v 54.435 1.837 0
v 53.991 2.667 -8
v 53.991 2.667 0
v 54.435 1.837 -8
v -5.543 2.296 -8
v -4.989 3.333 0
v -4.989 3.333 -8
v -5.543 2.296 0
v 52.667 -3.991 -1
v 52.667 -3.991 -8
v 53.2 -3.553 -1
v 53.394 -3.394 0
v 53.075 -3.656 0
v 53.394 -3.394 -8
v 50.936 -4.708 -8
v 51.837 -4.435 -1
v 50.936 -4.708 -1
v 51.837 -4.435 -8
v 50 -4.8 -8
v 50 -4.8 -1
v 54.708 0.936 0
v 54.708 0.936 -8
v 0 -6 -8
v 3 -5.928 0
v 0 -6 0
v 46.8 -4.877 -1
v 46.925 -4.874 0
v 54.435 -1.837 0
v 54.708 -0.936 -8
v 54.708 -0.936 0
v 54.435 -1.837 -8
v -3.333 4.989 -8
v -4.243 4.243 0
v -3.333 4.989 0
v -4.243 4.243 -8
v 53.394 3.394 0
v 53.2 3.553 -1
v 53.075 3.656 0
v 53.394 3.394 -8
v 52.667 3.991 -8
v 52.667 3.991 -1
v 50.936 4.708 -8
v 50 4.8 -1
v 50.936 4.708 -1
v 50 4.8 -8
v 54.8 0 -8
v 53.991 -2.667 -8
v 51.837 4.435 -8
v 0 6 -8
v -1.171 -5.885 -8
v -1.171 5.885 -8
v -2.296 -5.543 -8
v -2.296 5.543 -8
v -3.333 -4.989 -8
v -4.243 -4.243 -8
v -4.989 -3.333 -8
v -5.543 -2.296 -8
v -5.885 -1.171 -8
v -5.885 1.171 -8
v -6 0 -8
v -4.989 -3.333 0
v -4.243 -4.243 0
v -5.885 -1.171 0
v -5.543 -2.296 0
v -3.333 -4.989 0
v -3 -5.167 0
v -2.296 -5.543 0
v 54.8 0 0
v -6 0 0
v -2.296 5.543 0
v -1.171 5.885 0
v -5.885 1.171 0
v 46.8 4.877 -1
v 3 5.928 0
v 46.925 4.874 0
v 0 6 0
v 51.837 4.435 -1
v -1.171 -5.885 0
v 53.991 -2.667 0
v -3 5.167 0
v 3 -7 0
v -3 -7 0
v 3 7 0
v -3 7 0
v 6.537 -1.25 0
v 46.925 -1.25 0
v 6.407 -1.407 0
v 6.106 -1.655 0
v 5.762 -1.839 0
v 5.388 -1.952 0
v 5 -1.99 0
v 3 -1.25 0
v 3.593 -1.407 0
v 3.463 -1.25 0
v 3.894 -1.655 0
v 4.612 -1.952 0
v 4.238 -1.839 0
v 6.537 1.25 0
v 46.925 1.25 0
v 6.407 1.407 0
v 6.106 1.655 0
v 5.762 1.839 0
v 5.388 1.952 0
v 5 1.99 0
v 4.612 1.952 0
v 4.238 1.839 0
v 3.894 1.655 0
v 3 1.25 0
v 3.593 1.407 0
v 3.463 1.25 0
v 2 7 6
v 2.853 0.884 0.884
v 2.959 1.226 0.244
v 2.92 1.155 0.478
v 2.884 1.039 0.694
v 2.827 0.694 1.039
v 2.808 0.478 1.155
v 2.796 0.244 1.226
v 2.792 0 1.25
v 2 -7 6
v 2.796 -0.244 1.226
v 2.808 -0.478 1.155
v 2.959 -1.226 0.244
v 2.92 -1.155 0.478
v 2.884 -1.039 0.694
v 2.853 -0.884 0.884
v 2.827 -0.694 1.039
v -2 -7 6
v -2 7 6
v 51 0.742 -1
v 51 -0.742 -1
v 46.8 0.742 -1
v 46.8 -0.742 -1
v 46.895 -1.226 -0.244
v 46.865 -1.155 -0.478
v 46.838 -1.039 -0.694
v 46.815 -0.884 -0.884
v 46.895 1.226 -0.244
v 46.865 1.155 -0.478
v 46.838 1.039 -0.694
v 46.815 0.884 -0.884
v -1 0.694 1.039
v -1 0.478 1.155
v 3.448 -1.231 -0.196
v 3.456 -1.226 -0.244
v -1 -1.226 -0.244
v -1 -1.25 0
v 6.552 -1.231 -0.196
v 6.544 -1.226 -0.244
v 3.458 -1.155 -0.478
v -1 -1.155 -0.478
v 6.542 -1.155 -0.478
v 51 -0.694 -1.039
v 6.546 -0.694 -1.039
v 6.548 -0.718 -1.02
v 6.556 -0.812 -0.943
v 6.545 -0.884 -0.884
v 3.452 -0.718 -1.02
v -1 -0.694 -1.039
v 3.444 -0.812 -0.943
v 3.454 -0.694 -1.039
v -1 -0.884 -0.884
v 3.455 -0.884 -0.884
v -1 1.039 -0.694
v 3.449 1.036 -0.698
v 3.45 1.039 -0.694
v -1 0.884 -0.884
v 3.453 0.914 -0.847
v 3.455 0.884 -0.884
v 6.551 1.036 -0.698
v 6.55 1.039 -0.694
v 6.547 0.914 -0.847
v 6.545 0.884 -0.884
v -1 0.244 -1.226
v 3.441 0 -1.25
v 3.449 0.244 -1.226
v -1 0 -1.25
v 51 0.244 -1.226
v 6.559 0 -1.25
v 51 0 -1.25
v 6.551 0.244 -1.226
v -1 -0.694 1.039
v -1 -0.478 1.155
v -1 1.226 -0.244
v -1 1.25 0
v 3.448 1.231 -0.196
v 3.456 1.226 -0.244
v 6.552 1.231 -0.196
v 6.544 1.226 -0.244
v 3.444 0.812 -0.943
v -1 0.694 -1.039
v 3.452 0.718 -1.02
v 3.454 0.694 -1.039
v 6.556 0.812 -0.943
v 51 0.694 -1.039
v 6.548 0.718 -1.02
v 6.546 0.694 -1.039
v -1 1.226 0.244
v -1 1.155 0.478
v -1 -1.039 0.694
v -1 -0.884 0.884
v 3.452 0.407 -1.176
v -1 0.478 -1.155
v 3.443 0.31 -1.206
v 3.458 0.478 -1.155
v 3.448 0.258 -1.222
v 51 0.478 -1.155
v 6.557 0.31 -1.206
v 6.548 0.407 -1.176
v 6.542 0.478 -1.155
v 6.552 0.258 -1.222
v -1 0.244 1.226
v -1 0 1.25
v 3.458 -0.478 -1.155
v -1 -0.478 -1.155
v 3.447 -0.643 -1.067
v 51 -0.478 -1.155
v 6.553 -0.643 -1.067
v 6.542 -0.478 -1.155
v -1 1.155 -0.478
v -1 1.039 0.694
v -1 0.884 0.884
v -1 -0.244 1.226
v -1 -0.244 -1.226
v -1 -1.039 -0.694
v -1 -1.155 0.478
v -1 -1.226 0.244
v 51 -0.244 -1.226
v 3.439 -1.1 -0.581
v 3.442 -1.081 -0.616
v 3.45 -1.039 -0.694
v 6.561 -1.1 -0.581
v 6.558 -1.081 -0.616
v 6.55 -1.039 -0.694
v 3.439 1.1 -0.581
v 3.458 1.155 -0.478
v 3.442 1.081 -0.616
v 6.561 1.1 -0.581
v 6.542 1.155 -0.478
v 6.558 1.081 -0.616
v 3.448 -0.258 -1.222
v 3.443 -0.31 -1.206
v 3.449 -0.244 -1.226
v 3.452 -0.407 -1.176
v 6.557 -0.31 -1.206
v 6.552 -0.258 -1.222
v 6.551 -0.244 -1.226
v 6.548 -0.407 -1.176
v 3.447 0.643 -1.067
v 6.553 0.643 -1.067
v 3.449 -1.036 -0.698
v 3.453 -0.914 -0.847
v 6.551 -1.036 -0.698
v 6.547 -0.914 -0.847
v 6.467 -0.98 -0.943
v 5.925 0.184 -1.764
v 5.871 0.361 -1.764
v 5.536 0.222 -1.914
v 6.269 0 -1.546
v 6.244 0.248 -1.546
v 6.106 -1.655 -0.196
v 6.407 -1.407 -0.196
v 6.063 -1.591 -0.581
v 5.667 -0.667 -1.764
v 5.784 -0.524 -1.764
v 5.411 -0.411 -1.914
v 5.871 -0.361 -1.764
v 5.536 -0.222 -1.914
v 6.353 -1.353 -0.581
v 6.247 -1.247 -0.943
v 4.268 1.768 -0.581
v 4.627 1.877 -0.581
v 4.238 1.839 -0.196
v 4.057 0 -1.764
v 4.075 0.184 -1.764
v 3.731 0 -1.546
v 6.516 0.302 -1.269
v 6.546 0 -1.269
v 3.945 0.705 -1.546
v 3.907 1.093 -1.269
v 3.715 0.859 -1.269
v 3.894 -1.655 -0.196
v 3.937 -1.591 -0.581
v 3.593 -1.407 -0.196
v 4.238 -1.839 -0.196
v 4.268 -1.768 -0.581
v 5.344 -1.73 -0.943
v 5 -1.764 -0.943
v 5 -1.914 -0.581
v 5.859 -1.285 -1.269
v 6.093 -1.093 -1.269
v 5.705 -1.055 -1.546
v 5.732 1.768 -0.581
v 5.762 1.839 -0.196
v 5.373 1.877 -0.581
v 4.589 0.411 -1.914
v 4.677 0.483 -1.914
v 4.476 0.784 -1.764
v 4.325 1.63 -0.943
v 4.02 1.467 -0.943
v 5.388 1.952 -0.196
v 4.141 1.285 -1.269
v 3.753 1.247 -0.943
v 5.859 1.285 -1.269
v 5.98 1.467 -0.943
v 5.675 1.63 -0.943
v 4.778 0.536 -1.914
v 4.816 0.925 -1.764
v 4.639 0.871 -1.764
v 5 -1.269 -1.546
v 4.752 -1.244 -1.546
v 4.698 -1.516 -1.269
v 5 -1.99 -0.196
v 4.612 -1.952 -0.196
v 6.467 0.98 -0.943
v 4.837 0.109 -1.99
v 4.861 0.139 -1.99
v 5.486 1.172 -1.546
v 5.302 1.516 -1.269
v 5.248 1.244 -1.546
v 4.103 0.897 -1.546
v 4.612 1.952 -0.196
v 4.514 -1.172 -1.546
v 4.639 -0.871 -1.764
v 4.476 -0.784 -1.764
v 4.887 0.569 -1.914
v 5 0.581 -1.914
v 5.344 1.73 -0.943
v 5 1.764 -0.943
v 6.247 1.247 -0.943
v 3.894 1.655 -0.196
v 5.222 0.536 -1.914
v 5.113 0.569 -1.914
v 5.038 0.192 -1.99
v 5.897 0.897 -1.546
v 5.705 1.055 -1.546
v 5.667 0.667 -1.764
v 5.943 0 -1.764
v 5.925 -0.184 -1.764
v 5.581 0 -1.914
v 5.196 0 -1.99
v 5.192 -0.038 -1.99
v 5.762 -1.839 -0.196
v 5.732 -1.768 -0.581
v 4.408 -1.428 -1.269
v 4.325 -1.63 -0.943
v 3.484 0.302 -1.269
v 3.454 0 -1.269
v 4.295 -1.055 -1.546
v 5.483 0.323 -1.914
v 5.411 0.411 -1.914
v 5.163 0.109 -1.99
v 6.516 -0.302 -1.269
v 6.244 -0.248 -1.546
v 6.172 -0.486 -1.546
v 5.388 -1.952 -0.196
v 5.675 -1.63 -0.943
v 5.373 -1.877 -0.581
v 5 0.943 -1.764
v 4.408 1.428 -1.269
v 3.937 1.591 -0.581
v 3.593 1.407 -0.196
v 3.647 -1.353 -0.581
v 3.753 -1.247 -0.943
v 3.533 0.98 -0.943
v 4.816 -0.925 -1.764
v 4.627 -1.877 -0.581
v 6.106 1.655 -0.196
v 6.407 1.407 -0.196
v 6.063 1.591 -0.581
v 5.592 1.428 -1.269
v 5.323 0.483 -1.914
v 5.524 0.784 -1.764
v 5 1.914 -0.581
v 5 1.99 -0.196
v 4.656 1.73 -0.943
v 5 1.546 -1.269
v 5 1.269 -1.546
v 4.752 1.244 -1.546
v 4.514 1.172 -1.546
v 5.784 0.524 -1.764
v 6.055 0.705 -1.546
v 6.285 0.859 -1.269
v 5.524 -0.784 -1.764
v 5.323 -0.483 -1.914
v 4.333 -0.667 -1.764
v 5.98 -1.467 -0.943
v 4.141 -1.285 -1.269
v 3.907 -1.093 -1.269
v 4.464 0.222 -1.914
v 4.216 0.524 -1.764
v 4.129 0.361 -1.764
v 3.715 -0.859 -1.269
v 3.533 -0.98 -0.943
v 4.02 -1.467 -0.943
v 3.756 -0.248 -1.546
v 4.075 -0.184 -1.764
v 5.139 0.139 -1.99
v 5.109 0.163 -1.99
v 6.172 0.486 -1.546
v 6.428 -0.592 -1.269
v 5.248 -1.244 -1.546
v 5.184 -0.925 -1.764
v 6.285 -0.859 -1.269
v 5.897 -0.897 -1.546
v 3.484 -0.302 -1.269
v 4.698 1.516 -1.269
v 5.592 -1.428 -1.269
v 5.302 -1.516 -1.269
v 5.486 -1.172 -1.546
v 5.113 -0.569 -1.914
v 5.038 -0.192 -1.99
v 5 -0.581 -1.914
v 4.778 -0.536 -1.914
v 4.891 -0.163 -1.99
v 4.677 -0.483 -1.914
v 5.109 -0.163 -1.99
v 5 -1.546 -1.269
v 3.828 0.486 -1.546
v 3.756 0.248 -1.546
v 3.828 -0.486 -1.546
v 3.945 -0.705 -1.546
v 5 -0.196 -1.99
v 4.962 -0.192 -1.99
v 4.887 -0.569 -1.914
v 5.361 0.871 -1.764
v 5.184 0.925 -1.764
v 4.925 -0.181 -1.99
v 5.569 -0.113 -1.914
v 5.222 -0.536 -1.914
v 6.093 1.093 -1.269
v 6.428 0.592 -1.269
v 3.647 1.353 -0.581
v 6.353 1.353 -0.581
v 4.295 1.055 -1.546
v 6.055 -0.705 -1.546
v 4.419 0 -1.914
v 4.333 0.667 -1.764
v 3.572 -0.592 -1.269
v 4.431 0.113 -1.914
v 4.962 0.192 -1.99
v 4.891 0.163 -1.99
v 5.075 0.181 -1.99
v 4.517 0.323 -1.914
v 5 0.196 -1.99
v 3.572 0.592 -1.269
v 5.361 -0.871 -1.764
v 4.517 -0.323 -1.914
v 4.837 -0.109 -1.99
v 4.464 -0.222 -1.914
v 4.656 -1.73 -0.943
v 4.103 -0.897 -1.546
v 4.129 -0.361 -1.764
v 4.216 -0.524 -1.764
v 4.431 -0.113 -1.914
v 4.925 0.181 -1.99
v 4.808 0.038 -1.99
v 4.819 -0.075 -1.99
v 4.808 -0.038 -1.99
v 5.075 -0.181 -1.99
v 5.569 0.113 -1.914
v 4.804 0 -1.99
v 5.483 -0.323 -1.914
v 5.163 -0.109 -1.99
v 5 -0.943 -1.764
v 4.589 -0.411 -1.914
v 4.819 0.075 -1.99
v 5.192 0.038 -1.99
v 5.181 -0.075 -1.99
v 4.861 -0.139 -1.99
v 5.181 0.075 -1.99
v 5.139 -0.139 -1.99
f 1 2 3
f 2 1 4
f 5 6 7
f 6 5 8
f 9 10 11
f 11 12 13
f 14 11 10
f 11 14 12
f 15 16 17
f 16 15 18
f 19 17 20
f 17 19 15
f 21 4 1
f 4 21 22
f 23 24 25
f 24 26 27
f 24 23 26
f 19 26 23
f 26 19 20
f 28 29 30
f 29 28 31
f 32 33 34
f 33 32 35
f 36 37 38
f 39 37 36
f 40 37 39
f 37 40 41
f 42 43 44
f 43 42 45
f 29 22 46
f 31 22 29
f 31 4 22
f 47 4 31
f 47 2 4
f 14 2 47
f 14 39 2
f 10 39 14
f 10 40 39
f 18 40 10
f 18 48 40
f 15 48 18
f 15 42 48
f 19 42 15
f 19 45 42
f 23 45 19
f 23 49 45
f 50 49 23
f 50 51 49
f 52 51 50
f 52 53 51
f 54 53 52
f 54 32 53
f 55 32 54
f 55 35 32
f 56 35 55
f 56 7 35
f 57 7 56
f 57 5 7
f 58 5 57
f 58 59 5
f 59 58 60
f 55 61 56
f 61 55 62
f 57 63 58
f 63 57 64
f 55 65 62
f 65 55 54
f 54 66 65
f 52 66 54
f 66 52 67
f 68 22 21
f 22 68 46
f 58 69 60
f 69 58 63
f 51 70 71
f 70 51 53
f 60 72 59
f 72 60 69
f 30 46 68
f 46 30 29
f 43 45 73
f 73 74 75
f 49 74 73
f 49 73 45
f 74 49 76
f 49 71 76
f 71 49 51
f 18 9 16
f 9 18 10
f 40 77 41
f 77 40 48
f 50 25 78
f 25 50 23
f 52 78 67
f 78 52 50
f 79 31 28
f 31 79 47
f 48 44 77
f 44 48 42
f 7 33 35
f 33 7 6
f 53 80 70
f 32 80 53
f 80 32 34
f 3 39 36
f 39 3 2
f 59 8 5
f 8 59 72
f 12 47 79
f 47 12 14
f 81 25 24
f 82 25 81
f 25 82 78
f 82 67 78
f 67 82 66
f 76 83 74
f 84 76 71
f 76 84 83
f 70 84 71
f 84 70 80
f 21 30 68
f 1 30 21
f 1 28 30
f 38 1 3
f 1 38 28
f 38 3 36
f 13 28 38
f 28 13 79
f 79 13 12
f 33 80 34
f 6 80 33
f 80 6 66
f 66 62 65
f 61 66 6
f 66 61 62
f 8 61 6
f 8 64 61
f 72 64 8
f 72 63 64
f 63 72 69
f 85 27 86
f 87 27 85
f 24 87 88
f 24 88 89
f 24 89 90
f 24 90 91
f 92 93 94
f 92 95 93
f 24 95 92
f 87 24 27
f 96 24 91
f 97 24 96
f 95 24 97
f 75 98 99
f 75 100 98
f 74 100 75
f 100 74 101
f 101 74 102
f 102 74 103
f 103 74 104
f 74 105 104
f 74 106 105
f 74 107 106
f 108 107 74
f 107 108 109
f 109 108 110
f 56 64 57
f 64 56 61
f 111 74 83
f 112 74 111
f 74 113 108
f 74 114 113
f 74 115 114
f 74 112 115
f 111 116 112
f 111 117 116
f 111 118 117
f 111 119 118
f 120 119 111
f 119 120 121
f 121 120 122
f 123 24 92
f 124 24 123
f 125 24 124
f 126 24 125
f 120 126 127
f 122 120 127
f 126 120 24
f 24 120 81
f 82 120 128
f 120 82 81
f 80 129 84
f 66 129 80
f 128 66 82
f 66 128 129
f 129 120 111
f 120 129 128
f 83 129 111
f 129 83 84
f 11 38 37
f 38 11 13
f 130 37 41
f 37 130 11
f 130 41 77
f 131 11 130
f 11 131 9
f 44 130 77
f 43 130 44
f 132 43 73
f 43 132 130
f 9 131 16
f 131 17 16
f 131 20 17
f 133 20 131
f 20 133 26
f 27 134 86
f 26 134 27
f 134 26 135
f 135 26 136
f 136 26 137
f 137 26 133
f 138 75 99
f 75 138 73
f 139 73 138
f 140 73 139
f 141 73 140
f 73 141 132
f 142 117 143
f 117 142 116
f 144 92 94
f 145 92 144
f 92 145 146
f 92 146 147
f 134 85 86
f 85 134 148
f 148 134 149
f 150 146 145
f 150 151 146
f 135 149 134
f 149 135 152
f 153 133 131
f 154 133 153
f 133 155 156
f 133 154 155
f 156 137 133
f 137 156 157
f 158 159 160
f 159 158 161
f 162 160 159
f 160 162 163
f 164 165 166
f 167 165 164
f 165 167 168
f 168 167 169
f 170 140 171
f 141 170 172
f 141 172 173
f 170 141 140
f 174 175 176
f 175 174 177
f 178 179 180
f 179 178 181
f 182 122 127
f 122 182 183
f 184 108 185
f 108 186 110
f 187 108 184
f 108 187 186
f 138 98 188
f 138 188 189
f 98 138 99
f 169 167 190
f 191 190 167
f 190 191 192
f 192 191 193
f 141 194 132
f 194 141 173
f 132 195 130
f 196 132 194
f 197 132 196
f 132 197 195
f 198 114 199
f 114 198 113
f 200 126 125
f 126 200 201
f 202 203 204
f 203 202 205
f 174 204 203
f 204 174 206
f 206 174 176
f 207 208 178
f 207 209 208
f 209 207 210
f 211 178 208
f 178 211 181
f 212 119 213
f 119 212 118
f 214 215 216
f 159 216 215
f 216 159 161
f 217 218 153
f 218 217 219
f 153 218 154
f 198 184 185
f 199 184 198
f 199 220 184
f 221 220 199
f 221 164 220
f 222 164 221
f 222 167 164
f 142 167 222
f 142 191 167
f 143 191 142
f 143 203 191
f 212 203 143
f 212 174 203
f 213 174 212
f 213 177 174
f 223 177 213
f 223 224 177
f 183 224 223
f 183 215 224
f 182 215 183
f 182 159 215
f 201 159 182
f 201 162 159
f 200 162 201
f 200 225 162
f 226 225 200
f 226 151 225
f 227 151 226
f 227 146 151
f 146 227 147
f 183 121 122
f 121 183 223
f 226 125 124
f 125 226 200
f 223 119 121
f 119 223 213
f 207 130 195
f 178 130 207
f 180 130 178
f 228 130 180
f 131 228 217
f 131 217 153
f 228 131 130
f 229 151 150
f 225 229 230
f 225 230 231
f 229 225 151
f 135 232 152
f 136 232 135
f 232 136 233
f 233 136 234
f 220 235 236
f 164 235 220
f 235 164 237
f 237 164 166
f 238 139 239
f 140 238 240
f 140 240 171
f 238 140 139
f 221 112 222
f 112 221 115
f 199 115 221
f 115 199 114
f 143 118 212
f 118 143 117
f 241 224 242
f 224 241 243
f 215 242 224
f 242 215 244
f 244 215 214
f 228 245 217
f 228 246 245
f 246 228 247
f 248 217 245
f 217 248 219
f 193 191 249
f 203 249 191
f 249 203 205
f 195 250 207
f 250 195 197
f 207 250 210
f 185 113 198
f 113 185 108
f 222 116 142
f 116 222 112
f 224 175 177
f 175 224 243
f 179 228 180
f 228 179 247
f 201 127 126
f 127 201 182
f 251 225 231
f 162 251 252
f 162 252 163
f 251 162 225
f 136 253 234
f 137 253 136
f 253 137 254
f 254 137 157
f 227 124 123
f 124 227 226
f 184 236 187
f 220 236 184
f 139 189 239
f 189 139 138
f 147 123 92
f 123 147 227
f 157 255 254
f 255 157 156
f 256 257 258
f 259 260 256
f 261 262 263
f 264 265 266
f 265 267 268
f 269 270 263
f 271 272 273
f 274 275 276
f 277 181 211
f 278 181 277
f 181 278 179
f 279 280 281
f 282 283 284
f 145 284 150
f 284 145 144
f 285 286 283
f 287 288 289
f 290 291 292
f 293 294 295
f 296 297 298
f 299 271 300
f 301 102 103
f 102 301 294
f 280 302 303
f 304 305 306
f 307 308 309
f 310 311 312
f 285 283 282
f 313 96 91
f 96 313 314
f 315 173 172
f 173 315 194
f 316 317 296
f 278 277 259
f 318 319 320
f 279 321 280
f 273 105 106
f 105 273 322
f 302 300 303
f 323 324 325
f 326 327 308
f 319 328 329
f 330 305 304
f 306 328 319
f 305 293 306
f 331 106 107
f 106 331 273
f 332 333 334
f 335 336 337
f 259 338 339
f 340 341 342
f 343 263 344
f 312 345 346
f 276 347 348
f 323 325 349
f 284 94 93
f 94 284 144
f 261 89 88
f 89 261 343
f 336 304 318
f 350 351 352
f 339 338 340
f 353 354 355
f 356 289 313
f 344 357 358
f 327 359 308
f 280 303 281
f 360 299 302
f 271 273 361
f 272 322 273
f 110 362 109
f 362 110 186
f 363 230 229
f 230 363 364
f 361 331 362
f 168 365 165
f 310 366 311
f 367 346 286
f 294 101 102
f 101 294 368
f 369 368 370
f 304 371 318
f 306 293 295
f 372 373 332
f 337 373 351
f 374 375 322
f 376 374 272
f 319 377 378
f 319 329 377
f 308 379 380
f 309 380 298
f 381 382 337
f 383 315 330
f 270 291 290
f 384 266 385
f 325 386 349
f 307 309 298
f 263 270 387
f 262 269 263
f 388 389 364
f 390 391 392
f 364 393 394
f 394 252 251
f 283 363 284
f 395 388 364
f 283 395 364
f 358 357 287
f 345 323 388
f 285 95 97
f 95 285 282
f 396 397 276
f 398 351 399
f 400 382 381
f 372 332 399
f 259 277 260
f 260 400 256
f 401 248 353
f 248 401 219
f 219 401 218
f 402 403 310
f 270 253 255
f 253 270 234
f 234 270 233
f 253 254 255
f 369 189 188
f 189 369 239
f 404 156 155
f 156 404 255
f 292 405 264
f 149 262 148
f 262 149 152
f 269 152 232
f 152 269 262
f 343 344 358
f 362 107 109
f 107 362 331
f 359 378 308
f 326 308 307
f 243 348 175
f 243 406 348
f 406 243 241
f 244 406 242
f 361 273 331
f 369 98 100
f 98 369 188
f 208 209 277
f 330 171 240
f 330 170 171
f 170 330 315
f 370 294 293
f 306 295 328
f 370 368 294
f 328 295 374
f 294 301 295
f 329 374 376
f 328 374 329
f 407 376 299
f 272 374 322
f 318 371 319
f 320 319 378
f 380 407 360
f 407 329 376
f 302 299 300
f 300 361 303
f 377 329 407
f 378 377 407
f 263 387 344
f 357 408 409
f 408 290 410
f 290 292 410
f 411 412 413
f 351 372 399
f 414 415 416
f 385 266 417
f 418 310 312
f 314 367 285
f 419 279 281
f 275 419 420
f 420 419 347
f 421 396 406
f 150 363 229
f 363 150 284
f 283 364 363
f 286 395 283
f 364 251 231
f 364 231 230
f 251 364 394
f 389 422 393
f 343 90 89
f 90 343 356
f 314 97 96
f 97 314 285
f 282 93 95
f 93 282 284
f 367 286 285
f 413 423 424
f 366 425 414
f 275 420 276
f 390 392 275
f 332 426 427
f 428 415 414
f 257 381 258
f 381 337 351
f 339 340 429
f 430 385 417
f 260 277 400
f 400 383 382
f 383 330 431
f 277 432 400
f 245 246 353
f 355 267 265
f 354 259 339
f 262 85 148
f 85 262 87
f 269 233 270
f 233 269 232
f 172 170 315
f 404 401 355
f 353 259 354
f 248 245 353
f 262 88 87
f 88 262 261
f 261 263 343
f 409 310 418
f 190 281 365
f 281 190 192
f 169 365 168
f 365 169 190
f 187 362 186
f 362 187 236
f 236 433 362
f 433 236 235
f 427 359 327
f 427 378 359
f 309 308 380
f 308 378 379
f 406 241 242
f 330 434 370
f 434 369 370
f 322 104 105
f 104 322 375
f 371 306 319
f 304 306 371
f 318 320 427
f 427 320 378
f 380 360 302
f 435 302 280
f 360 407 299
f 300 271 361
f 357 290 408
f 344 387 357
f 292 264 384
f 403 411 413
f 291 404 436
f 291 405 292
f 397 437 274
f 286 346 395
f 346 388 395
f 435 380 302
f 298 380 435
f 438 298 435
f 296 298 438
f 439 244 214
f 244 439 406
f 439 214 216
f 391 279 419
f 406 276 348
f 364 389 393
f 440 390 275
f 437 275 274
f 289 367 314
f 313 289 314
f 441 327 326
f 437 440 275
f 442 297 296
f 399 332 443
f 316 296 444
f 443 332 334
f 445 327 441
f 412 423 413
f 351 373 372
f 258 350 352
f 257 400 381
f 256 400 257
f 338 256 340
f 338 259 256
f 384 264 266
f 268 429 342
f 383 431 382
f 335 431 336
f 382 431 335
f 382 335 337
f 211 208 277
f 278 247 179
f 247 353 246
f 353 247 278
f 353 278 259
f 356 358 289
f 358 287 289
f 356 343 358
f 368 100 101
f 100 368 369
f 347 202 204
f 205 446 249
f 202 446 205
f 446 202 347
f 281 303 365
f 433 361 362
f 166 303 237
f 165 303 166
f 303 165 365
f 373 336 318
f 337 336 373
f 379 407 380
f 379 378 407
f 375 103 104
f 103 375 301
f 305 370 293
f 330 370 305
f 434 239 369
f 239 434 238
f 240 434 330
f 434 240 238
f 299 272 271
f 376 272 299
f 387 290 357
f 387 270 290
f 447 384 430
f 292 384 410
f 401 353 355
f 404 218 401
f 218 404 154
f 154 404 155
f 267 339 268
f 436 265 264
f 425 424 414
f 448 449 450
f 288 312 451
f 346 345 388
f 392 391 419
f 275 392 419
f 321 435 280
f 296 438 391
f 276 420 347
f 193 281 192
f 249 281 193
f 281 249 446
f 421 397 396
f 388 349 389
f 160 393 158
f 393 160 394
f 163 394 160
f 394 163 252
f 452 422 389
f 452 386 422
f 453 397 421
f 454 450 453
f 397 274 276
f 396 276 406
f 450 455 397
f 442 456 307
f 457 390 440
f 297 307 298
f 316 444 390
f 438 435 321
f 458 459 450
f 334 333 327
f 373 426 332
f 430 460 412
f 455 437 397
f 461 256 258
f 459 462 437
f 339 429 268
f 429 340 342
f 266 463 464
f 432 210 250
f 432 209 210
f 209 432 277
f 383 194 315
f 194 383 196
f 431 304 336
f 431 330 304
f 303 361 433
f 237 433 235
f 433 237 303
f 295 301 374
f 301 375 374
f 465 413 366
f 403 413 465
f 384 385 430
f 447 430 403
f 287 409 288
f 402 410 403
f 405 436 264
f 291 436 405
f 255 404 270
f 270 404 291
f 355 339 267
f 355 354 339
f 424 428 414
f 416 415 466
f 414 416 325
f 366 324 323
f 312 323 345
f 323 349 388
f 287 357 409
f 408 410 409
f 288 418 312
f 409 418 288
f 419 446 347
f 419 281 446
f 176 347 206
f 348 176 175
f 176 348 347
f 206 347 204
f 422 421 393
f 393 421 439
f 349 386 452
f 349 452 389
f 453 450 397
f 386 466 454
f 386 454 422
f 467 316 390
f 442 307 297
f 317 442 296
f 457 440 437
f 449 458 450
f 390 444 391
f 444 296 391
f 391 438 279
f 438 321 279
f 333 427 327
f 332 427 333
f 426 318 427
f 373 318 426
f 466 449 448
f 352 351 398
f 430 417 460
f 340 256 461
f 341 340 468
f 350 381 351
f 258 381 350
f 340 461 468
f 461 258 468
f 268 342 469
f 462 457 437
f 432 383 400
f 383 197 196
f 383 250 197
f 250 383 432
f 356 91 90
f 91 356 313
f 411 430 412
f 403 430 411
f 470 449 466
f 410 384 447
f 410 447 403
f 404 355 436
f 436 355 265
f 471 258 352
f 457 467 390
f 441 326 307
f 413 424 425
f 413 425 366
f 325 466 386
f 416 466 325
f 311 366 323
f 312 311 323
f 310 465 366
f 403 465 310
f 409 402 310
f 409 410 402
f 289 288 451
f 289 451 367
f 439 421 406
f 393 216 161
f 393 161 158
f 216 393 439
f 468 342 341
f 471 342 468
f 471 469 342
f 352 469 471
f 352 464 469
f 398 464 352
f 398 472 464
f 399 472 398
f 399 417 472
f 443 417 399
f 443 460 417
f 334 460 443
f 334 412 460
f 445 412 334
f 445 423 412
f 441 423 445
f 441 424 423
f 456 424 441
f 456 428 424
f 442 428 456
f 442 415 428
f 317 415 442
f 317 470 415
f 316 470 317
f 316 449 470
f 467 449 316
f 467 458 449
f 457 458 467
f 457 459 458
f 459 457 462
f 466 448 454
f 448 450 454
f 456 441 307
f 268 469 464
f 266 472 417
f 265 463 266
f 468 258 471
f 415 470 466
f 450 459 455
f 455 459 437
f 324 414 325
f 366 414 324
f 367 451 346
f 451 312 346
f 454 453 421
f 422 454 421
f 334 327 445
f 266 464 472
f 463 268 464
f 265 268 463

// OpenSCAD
// COBRA-Snap Finger Segment - proximal
// Dovetail slide joints, no glue needed

$fn = 32;

module finger_segment() {
    difference() {
        union() {
            // Main body
            hull() {
                translate([0, 0, -4])
                cylinder(h=8, d=12, center=true);
                
                translate([50.0, 0, -4])
                cylinder(h=8, d=9.600000000000001, center=true);
            }
            
            // Male dovetail (proximal end)
            translate([0, 0, 0])
            rotate([90, 0, 0])
            linear_extrude(height=14, center=true)
            polygon(points=[[-3, 0], [3, 0], [2, 6], [-2, 6]]);
        }
        
        // Female dovetail socket (distal end) - skip for distal
        
        translate([50.0, 0, 0])
        rotate([90, 0, 0])
        linear_extrude(height=11.600000000000001, center=true)
        polygon(points=[[-3.2, -1], [3.2, -1], [2.2, 7], [-2.2, 7]]);
        
        
        // Tendon channel
        translate([25.0, 0, 0])
        rotate([0, 90, 0])
        cylinder(h=52.0, d=2.5, center=true);
        
        // Quick-connect socket for tendon
        translate([5, 0, 0])
        sphere(d=4);
    }
}

finger_segment();
